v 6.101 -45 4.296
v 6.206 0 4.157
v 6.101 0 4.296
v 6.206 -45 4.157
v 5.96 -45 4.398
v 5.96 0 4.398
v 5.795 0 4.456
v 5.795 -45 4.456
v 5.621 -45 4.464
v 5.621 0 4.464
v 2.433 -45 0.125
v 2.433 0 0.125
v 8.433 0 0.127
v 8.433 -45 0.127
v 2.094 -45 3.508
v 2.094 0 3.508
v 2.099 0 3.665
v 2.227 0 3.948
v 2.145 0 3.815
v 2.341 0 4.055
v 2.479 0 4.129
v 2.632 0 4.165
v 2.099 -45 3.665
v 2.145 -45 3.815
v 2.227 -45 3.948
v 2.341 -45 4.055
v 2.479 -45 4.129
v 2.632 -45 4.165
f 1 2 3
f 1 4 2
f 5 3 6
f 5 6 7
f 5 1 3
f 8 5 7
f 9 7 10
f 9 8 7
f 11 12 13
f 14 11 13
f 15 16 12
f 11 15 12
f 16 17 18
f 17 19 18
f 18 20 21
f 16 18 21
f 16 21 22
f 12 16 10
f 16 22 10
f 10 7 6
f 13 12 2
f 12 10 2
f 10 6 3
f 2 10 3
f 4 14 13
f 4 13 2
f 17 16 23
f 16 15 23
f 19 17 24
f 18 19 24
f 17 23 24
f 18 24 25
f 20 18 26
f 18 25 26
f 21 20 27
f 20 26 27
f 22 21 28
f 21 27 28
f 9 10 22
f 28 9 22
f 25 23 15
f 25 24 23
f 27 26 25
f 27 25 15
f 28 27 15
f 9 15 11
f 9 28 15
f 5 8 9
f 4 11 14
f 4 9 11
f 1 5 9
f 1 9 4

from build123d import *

# Parameters (mm, degrees)
F1_DEPTH = 45
F2_R     = 0.6


with BuildPart() as f1:
    # F0 (on Front) → F1 (new body)
    with BuildSketch(Plane.XZ):
        Polygon((2.034771, 4.105063), (2.432787, 0.124914), (8.432787, 0.126559), (6.01492, 4.503078), align=None)
    extrude(amount=F1_DEPTH)

    # F2
    f2_edges = [f1.edges().sort_by_distance(p)[0] for p in [
        (2.034771, -22.5, 4.105063),
        (6.01492, -22.5, 4.503078),
    ]]
    fillet(f2_edges, radius=F2_R)


solid = f1.part
